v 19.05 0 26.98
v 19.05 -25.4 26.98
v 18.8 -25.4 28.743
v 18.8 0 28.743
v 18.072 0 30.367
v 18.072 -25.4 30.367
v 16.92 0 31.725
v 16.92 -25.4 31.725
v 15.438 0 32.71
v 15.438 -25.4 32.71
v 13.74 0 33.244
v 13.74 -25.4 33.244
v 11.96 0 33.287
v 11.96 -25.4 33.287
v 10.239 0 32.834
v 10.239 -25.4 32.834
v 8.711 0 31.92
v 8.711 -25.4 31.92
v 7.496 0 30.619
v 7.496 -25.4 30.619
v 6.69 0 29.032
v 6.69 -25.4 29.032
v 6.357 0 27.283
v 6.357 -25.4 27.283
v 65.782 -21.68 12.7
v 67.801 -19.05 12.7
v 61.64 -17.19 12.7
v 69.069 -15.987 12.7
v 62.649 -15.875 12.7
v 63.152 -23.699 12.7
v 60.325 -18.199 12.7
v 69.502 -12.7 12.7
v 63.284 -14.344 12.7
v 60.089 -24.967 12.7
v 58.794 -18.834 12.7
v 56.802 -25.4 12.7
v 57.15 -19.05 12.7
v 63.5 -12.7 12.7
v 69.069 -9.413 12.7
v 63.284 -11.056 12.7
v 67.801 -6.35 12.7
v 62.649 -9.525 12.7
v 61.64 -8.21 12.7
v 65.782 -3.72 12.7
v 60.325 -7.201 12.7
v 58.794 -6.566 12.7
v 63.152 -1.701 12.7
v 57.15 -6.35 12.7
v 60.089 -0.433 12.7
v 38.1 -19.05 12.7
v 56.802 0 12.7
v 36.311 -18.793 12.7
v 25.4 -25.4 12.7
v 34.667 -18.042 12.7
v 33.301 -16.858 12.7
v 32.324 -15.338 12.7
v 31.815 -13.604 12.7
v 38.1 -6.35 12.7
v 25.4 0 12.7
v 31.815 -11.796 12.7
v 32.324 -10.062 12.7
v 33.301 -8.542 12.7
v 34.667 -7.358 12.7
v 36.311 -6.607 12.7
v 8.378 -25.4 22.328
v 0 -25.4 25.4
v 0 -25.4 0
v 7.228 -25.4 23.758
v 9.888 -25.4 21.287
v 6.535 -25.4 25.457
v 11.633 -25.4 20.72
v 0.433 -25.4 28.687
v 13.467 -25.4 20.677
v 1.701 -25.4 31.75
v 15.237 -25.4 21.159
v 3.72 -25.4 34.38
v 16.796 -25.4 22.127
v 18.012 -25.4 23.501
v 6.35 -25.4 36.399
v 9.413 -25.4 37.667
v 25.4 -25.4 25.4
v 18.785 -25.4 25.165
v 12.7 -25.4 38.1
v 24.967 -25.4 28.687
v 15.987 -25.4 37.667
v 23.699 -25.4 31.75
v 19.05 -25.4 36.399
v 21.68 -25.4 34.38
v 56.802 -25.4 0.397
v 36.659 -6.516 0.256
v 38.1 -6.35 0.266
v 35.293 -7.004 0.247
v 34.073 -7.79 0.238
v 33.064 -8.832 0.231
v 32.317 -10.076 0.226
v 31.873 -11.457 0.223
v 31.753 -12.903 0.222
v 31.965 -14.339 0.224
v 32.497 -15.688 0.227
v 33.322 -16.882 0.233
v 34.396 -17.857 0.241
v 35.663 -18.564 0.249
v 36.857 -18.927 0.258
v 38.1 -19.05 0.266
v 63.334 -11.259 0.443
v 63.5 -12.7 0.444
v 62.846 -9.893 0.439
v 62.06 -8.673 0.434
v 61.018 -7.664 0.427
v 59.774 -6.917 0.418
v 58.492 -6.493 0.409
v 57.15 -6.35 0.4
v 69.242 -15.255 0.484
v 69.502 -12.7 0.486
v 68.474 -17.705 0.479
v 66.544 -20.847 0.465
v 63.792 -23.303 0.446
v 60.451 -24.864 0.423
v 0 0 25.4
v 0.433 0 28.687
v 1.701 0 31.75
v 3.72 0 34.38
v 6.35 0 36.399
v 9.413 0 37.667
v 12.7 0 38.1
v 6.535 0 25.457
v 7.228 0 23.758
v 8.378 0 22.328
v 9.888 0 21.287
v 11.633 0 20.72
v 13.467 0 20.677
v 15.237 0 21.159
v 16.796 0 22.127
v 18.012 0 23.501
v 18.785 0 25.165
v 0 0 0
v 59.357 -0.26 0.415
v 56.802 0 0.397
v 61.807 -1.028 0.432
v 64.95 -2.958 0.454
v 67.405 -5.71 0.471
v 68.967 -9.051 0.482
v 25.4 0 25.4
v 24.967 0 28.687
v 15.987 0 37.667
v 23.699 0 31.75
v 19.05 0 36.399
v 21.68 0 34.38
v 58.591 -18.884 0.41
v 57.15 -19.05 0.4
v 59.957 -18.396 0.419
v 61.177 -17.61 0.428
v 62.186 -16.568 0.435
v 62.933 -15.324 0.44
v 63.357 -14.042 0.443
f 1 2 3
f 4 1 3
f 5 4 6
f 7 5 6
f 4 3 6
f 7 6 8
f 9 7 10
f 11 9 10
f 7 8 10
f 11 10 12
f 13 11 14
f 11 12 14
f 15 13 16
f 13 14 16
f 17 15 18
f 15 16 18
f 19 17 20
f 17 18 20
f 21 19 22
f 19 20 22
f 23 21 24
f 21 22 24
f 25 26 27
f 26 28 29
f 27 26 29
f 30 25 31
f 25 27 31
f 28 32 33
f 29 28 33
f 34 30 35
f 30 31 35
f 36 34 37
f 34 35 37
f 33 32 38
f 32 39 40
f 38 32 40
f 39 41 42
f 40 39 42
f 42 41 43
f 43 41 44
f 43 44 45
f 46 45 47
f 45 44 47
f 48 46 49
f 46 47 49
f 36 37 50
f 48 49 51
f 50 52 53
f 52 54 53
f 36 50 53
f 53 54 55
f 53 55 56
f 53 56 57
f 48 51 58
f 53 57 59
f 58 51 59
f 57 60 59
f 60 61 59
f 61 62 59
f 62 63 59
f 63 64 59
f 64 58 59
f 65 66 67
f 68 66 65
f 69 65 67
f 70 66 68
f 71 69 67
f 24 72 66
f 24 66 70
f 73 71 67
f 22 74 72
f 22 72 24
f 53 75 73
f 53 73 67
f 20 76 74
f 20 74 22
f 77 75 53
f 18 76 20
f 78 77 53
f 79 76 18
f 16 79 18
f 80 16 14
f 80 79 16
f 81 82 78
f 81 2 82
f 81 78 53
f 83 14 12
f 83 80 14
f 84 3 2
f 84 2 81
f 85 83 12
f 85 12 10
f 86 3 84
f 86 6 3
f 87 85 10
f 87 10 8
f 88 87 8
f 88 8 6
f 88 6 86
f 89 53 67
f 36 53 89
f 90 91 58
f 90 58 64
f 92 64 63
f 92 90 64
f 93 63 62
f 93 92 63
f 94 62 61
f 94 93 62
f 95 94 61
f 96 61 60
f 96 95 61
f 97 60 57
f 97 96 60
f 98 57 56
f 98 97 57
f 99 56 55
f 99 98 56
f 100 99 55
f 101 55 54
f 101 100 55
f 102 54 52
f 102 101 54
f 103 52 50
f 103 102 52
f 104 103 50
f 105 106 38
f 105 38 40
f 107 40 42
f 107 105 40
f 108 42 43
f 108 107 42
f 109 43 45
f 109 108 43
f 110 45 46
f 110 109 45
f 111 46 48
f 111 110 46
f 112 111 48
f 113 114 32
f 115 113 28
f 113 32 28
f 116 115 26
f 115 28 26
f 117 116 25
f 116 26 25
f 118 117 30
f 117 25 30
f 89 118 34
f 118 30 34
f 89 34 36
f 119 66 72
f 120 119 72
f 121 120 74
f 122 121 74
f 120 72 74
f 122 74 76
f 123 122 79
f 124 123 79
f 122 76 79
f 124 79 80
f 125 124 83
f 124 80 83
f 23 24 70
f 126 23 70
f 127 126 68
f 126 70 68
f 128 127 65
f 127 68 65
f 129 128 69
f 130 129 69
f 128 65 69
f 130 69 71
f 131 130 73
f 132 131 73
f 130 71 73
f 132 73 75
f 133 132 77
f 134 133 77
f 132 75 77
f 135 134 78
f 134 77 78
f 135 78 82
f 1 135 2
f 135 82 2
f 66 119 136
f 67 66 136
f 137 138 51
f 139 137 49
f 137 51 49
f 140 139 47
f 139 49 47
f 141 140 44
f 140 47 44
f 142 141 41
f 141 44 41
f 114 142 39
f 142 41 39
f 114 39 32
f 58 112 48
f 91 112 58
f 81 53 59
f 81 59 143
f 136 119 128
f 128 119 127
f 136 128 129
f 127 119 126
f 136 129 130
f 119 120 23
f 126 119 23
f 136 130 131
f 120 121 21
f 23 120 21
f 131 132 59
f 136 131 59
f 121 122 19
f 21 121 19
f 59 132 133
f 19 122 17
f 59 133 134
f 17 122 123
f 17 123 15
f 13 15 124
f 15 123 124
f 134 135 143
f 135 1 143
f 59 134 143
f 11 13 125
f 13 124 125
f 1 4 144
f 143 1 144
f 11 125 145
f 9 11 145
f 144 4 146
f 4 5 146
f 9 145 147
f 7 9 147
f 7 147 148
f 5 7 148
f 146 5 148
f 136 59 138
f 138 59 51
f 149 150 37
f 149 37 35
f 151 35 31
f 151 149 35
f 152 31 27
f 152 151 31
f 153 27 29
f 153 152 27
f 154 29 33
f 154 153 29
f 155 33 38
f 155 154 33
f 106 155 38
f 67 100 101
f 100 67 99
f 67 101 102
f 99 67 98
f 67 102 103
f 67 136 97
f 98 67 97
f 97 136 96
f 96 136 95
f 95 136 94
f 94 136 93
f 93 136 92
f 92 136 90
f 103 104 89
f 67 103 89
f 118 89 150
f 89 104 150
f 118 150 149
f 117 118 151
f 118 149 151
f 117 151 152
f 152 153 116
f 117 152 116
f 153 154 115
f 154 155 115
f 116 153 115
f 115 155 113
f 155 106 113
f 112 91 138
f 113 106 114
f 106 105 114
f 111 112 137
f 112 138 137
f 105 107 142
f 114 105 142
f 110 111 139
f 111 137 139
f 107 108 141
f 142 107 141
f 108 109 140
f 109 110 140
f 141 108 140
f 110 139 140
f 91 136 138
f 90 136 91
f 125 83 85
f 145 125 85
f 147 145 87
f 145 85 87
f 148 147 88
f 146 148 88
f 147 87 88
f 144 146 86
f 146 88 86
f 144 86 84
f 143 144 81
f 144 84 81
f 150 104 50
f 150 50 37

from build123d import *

# Parameters (mm, degrees)
F1_DEPTH  = 25.4
F3_DEPTH  = 25.4
F5_DEPTH  = 101.6
F7_DEPTH  = 127
F8_DEPTH  = 25.4
F10_DEPTH = 25.4


with BuildPart() as f1:
    # F0 (on Front) → F1 (new body)
    with BuildSketch(Plane.XZ):
        Polygon((25.4, 38.1), (0, 38.1), (0, 0), (69.502056, 0.486028), (69.502056, 12.7), (25.4, 12.7), align=None)
    extrude(amount=F1_DEPTH)

    # F2 (on face) → F3 (cut)
    with BuildSketch(Plane.XY.offset(12.7)):
        with BuildLine():
            ThreePointArc((56.802056, 0), (65.782312, -3.719744), (69.502056, -12.7))
            Line((69.502056, -12.7), (69.502056, 0))
            Line((69.502056, 0), (56.802056, 0))
        make_face()
        with BuildLine():
            Line((56.802056, -25.4), (69.502056, -25.4))
            Line((69.502056, -25.4), (69.502056, -12.7))
            ThreePointArc((69.502056, -12.7), (65.782312, -21.680256), (56.802056, -25.4))
        make_face()
    extrude(amount=-F3_DEPTH, mode=Mode.SUBTRACT)

    # F4 (on face) → F5 (cut)
    with BuildSketch(Plane.XZ.offset(25.4)):
        with BuildLine():
            ThreePointArc((6.357221, 27.282854), (12.548588, 20.631922), (19.05, 26.980117))
            ThreePointArc((19.05, 26.980117), (12.851412, 33.328312), (6.357221, 27.282854))
        make_face()
    extrude(amount=-F5_DEPTH, mode=Mode.SUBTRACT)

    # F6 (on face) → F7 (cut)
    with BuildSketch(Plane.XZ.offset(25.4)):
        with BuildLine():
            ThreePointArc((12.7, 38.1), (21.680256, 34.380256), (25.4, 25.4))
            Line((25.4, 25.4), (25.4, 38.1))
            Line((25.4, 38.1), (12.7, 38.1))
        make_face()
        with BuildLine():
            ThreePointArc((0, 25.4), (3.719744, 34.380256), (12.7, 38.1))
            Line((12.7, 38.1), (0, 38.1))
            Line((0, 38.1), (0, 25.4))
        make_face()
    extrude(amount=F7_DEPTH, mode=Mode.SUBTRACT)

    # F6 (on face) → F8 (cut)
    with BuildSketch(Plane.XZ.offset(25.4)):
        with BuildLine():
            ThreePointArc((0, 25.4), (3.719744, 34.380256), (12.7, 38.1))
            Line((12.7, 38.1), (0, 38.1))
            Line((0, 38.1), (0, 25.4))
        make_face()
        with BuildLine():
            ThreePointArc((12.7, 38.1), (21.680256, 34.380256), (25.4, 25.4))
            Line((25.4, 25.4), (25.4, 38.1))
            Line((25.4, 38.1), (12.7, 38.1))
        make_face()
    extrude(amount=-F8_DEPTH, mode=Mode.SUBTRACT)

    # F9 (on Top) → F10 (cut)
    with BuildSketch(Plane.XY):
        with BuildLine():
            ThreePointArc((63.5, -12.7), (61.640128, -8.209872), (57.15, -6.35))
            ThreePointArc((57.15, -6.35), (50.8, -12.7), (57.15, -19.05))
            ThreePointArc((57.15, -19.05), (61.640128, -17.190128), (63.5, -12.7))
        make_face()
        with BuildLine():
            ThreePointArc((38.1, -6.35), (42.590128, -8.209872), (44.45, -12.7))
            ThreePointArc((44.45, -12.7), (42.590128, -17.190128), (38.1, -19.05))
            Line((38.1, -19.05), (57.15, -19.05))
            ThreePointArc((57.15, -19.05), (50.8, -12.7), (57.15, -6.35))
            Line((57.15, -6.35), (38.1, -6.35))
        make_face()
        with BuildLine():
            ThreePointArc((38.1, -19.05), (42.590128, -17.190128), (44.45, -12.7))
            ThreePointArc((44.45, -12.7), (42.590128, -8.209872), (38.1, -6.35))
            ThreePointArc((38.1, -6.35), (31.75, -12.7), (38.1, -19.05))
        make_face()
    extrude(amount=F10_DEPTH, mode=Mode.SUBTRACT)


solid = f1.part
